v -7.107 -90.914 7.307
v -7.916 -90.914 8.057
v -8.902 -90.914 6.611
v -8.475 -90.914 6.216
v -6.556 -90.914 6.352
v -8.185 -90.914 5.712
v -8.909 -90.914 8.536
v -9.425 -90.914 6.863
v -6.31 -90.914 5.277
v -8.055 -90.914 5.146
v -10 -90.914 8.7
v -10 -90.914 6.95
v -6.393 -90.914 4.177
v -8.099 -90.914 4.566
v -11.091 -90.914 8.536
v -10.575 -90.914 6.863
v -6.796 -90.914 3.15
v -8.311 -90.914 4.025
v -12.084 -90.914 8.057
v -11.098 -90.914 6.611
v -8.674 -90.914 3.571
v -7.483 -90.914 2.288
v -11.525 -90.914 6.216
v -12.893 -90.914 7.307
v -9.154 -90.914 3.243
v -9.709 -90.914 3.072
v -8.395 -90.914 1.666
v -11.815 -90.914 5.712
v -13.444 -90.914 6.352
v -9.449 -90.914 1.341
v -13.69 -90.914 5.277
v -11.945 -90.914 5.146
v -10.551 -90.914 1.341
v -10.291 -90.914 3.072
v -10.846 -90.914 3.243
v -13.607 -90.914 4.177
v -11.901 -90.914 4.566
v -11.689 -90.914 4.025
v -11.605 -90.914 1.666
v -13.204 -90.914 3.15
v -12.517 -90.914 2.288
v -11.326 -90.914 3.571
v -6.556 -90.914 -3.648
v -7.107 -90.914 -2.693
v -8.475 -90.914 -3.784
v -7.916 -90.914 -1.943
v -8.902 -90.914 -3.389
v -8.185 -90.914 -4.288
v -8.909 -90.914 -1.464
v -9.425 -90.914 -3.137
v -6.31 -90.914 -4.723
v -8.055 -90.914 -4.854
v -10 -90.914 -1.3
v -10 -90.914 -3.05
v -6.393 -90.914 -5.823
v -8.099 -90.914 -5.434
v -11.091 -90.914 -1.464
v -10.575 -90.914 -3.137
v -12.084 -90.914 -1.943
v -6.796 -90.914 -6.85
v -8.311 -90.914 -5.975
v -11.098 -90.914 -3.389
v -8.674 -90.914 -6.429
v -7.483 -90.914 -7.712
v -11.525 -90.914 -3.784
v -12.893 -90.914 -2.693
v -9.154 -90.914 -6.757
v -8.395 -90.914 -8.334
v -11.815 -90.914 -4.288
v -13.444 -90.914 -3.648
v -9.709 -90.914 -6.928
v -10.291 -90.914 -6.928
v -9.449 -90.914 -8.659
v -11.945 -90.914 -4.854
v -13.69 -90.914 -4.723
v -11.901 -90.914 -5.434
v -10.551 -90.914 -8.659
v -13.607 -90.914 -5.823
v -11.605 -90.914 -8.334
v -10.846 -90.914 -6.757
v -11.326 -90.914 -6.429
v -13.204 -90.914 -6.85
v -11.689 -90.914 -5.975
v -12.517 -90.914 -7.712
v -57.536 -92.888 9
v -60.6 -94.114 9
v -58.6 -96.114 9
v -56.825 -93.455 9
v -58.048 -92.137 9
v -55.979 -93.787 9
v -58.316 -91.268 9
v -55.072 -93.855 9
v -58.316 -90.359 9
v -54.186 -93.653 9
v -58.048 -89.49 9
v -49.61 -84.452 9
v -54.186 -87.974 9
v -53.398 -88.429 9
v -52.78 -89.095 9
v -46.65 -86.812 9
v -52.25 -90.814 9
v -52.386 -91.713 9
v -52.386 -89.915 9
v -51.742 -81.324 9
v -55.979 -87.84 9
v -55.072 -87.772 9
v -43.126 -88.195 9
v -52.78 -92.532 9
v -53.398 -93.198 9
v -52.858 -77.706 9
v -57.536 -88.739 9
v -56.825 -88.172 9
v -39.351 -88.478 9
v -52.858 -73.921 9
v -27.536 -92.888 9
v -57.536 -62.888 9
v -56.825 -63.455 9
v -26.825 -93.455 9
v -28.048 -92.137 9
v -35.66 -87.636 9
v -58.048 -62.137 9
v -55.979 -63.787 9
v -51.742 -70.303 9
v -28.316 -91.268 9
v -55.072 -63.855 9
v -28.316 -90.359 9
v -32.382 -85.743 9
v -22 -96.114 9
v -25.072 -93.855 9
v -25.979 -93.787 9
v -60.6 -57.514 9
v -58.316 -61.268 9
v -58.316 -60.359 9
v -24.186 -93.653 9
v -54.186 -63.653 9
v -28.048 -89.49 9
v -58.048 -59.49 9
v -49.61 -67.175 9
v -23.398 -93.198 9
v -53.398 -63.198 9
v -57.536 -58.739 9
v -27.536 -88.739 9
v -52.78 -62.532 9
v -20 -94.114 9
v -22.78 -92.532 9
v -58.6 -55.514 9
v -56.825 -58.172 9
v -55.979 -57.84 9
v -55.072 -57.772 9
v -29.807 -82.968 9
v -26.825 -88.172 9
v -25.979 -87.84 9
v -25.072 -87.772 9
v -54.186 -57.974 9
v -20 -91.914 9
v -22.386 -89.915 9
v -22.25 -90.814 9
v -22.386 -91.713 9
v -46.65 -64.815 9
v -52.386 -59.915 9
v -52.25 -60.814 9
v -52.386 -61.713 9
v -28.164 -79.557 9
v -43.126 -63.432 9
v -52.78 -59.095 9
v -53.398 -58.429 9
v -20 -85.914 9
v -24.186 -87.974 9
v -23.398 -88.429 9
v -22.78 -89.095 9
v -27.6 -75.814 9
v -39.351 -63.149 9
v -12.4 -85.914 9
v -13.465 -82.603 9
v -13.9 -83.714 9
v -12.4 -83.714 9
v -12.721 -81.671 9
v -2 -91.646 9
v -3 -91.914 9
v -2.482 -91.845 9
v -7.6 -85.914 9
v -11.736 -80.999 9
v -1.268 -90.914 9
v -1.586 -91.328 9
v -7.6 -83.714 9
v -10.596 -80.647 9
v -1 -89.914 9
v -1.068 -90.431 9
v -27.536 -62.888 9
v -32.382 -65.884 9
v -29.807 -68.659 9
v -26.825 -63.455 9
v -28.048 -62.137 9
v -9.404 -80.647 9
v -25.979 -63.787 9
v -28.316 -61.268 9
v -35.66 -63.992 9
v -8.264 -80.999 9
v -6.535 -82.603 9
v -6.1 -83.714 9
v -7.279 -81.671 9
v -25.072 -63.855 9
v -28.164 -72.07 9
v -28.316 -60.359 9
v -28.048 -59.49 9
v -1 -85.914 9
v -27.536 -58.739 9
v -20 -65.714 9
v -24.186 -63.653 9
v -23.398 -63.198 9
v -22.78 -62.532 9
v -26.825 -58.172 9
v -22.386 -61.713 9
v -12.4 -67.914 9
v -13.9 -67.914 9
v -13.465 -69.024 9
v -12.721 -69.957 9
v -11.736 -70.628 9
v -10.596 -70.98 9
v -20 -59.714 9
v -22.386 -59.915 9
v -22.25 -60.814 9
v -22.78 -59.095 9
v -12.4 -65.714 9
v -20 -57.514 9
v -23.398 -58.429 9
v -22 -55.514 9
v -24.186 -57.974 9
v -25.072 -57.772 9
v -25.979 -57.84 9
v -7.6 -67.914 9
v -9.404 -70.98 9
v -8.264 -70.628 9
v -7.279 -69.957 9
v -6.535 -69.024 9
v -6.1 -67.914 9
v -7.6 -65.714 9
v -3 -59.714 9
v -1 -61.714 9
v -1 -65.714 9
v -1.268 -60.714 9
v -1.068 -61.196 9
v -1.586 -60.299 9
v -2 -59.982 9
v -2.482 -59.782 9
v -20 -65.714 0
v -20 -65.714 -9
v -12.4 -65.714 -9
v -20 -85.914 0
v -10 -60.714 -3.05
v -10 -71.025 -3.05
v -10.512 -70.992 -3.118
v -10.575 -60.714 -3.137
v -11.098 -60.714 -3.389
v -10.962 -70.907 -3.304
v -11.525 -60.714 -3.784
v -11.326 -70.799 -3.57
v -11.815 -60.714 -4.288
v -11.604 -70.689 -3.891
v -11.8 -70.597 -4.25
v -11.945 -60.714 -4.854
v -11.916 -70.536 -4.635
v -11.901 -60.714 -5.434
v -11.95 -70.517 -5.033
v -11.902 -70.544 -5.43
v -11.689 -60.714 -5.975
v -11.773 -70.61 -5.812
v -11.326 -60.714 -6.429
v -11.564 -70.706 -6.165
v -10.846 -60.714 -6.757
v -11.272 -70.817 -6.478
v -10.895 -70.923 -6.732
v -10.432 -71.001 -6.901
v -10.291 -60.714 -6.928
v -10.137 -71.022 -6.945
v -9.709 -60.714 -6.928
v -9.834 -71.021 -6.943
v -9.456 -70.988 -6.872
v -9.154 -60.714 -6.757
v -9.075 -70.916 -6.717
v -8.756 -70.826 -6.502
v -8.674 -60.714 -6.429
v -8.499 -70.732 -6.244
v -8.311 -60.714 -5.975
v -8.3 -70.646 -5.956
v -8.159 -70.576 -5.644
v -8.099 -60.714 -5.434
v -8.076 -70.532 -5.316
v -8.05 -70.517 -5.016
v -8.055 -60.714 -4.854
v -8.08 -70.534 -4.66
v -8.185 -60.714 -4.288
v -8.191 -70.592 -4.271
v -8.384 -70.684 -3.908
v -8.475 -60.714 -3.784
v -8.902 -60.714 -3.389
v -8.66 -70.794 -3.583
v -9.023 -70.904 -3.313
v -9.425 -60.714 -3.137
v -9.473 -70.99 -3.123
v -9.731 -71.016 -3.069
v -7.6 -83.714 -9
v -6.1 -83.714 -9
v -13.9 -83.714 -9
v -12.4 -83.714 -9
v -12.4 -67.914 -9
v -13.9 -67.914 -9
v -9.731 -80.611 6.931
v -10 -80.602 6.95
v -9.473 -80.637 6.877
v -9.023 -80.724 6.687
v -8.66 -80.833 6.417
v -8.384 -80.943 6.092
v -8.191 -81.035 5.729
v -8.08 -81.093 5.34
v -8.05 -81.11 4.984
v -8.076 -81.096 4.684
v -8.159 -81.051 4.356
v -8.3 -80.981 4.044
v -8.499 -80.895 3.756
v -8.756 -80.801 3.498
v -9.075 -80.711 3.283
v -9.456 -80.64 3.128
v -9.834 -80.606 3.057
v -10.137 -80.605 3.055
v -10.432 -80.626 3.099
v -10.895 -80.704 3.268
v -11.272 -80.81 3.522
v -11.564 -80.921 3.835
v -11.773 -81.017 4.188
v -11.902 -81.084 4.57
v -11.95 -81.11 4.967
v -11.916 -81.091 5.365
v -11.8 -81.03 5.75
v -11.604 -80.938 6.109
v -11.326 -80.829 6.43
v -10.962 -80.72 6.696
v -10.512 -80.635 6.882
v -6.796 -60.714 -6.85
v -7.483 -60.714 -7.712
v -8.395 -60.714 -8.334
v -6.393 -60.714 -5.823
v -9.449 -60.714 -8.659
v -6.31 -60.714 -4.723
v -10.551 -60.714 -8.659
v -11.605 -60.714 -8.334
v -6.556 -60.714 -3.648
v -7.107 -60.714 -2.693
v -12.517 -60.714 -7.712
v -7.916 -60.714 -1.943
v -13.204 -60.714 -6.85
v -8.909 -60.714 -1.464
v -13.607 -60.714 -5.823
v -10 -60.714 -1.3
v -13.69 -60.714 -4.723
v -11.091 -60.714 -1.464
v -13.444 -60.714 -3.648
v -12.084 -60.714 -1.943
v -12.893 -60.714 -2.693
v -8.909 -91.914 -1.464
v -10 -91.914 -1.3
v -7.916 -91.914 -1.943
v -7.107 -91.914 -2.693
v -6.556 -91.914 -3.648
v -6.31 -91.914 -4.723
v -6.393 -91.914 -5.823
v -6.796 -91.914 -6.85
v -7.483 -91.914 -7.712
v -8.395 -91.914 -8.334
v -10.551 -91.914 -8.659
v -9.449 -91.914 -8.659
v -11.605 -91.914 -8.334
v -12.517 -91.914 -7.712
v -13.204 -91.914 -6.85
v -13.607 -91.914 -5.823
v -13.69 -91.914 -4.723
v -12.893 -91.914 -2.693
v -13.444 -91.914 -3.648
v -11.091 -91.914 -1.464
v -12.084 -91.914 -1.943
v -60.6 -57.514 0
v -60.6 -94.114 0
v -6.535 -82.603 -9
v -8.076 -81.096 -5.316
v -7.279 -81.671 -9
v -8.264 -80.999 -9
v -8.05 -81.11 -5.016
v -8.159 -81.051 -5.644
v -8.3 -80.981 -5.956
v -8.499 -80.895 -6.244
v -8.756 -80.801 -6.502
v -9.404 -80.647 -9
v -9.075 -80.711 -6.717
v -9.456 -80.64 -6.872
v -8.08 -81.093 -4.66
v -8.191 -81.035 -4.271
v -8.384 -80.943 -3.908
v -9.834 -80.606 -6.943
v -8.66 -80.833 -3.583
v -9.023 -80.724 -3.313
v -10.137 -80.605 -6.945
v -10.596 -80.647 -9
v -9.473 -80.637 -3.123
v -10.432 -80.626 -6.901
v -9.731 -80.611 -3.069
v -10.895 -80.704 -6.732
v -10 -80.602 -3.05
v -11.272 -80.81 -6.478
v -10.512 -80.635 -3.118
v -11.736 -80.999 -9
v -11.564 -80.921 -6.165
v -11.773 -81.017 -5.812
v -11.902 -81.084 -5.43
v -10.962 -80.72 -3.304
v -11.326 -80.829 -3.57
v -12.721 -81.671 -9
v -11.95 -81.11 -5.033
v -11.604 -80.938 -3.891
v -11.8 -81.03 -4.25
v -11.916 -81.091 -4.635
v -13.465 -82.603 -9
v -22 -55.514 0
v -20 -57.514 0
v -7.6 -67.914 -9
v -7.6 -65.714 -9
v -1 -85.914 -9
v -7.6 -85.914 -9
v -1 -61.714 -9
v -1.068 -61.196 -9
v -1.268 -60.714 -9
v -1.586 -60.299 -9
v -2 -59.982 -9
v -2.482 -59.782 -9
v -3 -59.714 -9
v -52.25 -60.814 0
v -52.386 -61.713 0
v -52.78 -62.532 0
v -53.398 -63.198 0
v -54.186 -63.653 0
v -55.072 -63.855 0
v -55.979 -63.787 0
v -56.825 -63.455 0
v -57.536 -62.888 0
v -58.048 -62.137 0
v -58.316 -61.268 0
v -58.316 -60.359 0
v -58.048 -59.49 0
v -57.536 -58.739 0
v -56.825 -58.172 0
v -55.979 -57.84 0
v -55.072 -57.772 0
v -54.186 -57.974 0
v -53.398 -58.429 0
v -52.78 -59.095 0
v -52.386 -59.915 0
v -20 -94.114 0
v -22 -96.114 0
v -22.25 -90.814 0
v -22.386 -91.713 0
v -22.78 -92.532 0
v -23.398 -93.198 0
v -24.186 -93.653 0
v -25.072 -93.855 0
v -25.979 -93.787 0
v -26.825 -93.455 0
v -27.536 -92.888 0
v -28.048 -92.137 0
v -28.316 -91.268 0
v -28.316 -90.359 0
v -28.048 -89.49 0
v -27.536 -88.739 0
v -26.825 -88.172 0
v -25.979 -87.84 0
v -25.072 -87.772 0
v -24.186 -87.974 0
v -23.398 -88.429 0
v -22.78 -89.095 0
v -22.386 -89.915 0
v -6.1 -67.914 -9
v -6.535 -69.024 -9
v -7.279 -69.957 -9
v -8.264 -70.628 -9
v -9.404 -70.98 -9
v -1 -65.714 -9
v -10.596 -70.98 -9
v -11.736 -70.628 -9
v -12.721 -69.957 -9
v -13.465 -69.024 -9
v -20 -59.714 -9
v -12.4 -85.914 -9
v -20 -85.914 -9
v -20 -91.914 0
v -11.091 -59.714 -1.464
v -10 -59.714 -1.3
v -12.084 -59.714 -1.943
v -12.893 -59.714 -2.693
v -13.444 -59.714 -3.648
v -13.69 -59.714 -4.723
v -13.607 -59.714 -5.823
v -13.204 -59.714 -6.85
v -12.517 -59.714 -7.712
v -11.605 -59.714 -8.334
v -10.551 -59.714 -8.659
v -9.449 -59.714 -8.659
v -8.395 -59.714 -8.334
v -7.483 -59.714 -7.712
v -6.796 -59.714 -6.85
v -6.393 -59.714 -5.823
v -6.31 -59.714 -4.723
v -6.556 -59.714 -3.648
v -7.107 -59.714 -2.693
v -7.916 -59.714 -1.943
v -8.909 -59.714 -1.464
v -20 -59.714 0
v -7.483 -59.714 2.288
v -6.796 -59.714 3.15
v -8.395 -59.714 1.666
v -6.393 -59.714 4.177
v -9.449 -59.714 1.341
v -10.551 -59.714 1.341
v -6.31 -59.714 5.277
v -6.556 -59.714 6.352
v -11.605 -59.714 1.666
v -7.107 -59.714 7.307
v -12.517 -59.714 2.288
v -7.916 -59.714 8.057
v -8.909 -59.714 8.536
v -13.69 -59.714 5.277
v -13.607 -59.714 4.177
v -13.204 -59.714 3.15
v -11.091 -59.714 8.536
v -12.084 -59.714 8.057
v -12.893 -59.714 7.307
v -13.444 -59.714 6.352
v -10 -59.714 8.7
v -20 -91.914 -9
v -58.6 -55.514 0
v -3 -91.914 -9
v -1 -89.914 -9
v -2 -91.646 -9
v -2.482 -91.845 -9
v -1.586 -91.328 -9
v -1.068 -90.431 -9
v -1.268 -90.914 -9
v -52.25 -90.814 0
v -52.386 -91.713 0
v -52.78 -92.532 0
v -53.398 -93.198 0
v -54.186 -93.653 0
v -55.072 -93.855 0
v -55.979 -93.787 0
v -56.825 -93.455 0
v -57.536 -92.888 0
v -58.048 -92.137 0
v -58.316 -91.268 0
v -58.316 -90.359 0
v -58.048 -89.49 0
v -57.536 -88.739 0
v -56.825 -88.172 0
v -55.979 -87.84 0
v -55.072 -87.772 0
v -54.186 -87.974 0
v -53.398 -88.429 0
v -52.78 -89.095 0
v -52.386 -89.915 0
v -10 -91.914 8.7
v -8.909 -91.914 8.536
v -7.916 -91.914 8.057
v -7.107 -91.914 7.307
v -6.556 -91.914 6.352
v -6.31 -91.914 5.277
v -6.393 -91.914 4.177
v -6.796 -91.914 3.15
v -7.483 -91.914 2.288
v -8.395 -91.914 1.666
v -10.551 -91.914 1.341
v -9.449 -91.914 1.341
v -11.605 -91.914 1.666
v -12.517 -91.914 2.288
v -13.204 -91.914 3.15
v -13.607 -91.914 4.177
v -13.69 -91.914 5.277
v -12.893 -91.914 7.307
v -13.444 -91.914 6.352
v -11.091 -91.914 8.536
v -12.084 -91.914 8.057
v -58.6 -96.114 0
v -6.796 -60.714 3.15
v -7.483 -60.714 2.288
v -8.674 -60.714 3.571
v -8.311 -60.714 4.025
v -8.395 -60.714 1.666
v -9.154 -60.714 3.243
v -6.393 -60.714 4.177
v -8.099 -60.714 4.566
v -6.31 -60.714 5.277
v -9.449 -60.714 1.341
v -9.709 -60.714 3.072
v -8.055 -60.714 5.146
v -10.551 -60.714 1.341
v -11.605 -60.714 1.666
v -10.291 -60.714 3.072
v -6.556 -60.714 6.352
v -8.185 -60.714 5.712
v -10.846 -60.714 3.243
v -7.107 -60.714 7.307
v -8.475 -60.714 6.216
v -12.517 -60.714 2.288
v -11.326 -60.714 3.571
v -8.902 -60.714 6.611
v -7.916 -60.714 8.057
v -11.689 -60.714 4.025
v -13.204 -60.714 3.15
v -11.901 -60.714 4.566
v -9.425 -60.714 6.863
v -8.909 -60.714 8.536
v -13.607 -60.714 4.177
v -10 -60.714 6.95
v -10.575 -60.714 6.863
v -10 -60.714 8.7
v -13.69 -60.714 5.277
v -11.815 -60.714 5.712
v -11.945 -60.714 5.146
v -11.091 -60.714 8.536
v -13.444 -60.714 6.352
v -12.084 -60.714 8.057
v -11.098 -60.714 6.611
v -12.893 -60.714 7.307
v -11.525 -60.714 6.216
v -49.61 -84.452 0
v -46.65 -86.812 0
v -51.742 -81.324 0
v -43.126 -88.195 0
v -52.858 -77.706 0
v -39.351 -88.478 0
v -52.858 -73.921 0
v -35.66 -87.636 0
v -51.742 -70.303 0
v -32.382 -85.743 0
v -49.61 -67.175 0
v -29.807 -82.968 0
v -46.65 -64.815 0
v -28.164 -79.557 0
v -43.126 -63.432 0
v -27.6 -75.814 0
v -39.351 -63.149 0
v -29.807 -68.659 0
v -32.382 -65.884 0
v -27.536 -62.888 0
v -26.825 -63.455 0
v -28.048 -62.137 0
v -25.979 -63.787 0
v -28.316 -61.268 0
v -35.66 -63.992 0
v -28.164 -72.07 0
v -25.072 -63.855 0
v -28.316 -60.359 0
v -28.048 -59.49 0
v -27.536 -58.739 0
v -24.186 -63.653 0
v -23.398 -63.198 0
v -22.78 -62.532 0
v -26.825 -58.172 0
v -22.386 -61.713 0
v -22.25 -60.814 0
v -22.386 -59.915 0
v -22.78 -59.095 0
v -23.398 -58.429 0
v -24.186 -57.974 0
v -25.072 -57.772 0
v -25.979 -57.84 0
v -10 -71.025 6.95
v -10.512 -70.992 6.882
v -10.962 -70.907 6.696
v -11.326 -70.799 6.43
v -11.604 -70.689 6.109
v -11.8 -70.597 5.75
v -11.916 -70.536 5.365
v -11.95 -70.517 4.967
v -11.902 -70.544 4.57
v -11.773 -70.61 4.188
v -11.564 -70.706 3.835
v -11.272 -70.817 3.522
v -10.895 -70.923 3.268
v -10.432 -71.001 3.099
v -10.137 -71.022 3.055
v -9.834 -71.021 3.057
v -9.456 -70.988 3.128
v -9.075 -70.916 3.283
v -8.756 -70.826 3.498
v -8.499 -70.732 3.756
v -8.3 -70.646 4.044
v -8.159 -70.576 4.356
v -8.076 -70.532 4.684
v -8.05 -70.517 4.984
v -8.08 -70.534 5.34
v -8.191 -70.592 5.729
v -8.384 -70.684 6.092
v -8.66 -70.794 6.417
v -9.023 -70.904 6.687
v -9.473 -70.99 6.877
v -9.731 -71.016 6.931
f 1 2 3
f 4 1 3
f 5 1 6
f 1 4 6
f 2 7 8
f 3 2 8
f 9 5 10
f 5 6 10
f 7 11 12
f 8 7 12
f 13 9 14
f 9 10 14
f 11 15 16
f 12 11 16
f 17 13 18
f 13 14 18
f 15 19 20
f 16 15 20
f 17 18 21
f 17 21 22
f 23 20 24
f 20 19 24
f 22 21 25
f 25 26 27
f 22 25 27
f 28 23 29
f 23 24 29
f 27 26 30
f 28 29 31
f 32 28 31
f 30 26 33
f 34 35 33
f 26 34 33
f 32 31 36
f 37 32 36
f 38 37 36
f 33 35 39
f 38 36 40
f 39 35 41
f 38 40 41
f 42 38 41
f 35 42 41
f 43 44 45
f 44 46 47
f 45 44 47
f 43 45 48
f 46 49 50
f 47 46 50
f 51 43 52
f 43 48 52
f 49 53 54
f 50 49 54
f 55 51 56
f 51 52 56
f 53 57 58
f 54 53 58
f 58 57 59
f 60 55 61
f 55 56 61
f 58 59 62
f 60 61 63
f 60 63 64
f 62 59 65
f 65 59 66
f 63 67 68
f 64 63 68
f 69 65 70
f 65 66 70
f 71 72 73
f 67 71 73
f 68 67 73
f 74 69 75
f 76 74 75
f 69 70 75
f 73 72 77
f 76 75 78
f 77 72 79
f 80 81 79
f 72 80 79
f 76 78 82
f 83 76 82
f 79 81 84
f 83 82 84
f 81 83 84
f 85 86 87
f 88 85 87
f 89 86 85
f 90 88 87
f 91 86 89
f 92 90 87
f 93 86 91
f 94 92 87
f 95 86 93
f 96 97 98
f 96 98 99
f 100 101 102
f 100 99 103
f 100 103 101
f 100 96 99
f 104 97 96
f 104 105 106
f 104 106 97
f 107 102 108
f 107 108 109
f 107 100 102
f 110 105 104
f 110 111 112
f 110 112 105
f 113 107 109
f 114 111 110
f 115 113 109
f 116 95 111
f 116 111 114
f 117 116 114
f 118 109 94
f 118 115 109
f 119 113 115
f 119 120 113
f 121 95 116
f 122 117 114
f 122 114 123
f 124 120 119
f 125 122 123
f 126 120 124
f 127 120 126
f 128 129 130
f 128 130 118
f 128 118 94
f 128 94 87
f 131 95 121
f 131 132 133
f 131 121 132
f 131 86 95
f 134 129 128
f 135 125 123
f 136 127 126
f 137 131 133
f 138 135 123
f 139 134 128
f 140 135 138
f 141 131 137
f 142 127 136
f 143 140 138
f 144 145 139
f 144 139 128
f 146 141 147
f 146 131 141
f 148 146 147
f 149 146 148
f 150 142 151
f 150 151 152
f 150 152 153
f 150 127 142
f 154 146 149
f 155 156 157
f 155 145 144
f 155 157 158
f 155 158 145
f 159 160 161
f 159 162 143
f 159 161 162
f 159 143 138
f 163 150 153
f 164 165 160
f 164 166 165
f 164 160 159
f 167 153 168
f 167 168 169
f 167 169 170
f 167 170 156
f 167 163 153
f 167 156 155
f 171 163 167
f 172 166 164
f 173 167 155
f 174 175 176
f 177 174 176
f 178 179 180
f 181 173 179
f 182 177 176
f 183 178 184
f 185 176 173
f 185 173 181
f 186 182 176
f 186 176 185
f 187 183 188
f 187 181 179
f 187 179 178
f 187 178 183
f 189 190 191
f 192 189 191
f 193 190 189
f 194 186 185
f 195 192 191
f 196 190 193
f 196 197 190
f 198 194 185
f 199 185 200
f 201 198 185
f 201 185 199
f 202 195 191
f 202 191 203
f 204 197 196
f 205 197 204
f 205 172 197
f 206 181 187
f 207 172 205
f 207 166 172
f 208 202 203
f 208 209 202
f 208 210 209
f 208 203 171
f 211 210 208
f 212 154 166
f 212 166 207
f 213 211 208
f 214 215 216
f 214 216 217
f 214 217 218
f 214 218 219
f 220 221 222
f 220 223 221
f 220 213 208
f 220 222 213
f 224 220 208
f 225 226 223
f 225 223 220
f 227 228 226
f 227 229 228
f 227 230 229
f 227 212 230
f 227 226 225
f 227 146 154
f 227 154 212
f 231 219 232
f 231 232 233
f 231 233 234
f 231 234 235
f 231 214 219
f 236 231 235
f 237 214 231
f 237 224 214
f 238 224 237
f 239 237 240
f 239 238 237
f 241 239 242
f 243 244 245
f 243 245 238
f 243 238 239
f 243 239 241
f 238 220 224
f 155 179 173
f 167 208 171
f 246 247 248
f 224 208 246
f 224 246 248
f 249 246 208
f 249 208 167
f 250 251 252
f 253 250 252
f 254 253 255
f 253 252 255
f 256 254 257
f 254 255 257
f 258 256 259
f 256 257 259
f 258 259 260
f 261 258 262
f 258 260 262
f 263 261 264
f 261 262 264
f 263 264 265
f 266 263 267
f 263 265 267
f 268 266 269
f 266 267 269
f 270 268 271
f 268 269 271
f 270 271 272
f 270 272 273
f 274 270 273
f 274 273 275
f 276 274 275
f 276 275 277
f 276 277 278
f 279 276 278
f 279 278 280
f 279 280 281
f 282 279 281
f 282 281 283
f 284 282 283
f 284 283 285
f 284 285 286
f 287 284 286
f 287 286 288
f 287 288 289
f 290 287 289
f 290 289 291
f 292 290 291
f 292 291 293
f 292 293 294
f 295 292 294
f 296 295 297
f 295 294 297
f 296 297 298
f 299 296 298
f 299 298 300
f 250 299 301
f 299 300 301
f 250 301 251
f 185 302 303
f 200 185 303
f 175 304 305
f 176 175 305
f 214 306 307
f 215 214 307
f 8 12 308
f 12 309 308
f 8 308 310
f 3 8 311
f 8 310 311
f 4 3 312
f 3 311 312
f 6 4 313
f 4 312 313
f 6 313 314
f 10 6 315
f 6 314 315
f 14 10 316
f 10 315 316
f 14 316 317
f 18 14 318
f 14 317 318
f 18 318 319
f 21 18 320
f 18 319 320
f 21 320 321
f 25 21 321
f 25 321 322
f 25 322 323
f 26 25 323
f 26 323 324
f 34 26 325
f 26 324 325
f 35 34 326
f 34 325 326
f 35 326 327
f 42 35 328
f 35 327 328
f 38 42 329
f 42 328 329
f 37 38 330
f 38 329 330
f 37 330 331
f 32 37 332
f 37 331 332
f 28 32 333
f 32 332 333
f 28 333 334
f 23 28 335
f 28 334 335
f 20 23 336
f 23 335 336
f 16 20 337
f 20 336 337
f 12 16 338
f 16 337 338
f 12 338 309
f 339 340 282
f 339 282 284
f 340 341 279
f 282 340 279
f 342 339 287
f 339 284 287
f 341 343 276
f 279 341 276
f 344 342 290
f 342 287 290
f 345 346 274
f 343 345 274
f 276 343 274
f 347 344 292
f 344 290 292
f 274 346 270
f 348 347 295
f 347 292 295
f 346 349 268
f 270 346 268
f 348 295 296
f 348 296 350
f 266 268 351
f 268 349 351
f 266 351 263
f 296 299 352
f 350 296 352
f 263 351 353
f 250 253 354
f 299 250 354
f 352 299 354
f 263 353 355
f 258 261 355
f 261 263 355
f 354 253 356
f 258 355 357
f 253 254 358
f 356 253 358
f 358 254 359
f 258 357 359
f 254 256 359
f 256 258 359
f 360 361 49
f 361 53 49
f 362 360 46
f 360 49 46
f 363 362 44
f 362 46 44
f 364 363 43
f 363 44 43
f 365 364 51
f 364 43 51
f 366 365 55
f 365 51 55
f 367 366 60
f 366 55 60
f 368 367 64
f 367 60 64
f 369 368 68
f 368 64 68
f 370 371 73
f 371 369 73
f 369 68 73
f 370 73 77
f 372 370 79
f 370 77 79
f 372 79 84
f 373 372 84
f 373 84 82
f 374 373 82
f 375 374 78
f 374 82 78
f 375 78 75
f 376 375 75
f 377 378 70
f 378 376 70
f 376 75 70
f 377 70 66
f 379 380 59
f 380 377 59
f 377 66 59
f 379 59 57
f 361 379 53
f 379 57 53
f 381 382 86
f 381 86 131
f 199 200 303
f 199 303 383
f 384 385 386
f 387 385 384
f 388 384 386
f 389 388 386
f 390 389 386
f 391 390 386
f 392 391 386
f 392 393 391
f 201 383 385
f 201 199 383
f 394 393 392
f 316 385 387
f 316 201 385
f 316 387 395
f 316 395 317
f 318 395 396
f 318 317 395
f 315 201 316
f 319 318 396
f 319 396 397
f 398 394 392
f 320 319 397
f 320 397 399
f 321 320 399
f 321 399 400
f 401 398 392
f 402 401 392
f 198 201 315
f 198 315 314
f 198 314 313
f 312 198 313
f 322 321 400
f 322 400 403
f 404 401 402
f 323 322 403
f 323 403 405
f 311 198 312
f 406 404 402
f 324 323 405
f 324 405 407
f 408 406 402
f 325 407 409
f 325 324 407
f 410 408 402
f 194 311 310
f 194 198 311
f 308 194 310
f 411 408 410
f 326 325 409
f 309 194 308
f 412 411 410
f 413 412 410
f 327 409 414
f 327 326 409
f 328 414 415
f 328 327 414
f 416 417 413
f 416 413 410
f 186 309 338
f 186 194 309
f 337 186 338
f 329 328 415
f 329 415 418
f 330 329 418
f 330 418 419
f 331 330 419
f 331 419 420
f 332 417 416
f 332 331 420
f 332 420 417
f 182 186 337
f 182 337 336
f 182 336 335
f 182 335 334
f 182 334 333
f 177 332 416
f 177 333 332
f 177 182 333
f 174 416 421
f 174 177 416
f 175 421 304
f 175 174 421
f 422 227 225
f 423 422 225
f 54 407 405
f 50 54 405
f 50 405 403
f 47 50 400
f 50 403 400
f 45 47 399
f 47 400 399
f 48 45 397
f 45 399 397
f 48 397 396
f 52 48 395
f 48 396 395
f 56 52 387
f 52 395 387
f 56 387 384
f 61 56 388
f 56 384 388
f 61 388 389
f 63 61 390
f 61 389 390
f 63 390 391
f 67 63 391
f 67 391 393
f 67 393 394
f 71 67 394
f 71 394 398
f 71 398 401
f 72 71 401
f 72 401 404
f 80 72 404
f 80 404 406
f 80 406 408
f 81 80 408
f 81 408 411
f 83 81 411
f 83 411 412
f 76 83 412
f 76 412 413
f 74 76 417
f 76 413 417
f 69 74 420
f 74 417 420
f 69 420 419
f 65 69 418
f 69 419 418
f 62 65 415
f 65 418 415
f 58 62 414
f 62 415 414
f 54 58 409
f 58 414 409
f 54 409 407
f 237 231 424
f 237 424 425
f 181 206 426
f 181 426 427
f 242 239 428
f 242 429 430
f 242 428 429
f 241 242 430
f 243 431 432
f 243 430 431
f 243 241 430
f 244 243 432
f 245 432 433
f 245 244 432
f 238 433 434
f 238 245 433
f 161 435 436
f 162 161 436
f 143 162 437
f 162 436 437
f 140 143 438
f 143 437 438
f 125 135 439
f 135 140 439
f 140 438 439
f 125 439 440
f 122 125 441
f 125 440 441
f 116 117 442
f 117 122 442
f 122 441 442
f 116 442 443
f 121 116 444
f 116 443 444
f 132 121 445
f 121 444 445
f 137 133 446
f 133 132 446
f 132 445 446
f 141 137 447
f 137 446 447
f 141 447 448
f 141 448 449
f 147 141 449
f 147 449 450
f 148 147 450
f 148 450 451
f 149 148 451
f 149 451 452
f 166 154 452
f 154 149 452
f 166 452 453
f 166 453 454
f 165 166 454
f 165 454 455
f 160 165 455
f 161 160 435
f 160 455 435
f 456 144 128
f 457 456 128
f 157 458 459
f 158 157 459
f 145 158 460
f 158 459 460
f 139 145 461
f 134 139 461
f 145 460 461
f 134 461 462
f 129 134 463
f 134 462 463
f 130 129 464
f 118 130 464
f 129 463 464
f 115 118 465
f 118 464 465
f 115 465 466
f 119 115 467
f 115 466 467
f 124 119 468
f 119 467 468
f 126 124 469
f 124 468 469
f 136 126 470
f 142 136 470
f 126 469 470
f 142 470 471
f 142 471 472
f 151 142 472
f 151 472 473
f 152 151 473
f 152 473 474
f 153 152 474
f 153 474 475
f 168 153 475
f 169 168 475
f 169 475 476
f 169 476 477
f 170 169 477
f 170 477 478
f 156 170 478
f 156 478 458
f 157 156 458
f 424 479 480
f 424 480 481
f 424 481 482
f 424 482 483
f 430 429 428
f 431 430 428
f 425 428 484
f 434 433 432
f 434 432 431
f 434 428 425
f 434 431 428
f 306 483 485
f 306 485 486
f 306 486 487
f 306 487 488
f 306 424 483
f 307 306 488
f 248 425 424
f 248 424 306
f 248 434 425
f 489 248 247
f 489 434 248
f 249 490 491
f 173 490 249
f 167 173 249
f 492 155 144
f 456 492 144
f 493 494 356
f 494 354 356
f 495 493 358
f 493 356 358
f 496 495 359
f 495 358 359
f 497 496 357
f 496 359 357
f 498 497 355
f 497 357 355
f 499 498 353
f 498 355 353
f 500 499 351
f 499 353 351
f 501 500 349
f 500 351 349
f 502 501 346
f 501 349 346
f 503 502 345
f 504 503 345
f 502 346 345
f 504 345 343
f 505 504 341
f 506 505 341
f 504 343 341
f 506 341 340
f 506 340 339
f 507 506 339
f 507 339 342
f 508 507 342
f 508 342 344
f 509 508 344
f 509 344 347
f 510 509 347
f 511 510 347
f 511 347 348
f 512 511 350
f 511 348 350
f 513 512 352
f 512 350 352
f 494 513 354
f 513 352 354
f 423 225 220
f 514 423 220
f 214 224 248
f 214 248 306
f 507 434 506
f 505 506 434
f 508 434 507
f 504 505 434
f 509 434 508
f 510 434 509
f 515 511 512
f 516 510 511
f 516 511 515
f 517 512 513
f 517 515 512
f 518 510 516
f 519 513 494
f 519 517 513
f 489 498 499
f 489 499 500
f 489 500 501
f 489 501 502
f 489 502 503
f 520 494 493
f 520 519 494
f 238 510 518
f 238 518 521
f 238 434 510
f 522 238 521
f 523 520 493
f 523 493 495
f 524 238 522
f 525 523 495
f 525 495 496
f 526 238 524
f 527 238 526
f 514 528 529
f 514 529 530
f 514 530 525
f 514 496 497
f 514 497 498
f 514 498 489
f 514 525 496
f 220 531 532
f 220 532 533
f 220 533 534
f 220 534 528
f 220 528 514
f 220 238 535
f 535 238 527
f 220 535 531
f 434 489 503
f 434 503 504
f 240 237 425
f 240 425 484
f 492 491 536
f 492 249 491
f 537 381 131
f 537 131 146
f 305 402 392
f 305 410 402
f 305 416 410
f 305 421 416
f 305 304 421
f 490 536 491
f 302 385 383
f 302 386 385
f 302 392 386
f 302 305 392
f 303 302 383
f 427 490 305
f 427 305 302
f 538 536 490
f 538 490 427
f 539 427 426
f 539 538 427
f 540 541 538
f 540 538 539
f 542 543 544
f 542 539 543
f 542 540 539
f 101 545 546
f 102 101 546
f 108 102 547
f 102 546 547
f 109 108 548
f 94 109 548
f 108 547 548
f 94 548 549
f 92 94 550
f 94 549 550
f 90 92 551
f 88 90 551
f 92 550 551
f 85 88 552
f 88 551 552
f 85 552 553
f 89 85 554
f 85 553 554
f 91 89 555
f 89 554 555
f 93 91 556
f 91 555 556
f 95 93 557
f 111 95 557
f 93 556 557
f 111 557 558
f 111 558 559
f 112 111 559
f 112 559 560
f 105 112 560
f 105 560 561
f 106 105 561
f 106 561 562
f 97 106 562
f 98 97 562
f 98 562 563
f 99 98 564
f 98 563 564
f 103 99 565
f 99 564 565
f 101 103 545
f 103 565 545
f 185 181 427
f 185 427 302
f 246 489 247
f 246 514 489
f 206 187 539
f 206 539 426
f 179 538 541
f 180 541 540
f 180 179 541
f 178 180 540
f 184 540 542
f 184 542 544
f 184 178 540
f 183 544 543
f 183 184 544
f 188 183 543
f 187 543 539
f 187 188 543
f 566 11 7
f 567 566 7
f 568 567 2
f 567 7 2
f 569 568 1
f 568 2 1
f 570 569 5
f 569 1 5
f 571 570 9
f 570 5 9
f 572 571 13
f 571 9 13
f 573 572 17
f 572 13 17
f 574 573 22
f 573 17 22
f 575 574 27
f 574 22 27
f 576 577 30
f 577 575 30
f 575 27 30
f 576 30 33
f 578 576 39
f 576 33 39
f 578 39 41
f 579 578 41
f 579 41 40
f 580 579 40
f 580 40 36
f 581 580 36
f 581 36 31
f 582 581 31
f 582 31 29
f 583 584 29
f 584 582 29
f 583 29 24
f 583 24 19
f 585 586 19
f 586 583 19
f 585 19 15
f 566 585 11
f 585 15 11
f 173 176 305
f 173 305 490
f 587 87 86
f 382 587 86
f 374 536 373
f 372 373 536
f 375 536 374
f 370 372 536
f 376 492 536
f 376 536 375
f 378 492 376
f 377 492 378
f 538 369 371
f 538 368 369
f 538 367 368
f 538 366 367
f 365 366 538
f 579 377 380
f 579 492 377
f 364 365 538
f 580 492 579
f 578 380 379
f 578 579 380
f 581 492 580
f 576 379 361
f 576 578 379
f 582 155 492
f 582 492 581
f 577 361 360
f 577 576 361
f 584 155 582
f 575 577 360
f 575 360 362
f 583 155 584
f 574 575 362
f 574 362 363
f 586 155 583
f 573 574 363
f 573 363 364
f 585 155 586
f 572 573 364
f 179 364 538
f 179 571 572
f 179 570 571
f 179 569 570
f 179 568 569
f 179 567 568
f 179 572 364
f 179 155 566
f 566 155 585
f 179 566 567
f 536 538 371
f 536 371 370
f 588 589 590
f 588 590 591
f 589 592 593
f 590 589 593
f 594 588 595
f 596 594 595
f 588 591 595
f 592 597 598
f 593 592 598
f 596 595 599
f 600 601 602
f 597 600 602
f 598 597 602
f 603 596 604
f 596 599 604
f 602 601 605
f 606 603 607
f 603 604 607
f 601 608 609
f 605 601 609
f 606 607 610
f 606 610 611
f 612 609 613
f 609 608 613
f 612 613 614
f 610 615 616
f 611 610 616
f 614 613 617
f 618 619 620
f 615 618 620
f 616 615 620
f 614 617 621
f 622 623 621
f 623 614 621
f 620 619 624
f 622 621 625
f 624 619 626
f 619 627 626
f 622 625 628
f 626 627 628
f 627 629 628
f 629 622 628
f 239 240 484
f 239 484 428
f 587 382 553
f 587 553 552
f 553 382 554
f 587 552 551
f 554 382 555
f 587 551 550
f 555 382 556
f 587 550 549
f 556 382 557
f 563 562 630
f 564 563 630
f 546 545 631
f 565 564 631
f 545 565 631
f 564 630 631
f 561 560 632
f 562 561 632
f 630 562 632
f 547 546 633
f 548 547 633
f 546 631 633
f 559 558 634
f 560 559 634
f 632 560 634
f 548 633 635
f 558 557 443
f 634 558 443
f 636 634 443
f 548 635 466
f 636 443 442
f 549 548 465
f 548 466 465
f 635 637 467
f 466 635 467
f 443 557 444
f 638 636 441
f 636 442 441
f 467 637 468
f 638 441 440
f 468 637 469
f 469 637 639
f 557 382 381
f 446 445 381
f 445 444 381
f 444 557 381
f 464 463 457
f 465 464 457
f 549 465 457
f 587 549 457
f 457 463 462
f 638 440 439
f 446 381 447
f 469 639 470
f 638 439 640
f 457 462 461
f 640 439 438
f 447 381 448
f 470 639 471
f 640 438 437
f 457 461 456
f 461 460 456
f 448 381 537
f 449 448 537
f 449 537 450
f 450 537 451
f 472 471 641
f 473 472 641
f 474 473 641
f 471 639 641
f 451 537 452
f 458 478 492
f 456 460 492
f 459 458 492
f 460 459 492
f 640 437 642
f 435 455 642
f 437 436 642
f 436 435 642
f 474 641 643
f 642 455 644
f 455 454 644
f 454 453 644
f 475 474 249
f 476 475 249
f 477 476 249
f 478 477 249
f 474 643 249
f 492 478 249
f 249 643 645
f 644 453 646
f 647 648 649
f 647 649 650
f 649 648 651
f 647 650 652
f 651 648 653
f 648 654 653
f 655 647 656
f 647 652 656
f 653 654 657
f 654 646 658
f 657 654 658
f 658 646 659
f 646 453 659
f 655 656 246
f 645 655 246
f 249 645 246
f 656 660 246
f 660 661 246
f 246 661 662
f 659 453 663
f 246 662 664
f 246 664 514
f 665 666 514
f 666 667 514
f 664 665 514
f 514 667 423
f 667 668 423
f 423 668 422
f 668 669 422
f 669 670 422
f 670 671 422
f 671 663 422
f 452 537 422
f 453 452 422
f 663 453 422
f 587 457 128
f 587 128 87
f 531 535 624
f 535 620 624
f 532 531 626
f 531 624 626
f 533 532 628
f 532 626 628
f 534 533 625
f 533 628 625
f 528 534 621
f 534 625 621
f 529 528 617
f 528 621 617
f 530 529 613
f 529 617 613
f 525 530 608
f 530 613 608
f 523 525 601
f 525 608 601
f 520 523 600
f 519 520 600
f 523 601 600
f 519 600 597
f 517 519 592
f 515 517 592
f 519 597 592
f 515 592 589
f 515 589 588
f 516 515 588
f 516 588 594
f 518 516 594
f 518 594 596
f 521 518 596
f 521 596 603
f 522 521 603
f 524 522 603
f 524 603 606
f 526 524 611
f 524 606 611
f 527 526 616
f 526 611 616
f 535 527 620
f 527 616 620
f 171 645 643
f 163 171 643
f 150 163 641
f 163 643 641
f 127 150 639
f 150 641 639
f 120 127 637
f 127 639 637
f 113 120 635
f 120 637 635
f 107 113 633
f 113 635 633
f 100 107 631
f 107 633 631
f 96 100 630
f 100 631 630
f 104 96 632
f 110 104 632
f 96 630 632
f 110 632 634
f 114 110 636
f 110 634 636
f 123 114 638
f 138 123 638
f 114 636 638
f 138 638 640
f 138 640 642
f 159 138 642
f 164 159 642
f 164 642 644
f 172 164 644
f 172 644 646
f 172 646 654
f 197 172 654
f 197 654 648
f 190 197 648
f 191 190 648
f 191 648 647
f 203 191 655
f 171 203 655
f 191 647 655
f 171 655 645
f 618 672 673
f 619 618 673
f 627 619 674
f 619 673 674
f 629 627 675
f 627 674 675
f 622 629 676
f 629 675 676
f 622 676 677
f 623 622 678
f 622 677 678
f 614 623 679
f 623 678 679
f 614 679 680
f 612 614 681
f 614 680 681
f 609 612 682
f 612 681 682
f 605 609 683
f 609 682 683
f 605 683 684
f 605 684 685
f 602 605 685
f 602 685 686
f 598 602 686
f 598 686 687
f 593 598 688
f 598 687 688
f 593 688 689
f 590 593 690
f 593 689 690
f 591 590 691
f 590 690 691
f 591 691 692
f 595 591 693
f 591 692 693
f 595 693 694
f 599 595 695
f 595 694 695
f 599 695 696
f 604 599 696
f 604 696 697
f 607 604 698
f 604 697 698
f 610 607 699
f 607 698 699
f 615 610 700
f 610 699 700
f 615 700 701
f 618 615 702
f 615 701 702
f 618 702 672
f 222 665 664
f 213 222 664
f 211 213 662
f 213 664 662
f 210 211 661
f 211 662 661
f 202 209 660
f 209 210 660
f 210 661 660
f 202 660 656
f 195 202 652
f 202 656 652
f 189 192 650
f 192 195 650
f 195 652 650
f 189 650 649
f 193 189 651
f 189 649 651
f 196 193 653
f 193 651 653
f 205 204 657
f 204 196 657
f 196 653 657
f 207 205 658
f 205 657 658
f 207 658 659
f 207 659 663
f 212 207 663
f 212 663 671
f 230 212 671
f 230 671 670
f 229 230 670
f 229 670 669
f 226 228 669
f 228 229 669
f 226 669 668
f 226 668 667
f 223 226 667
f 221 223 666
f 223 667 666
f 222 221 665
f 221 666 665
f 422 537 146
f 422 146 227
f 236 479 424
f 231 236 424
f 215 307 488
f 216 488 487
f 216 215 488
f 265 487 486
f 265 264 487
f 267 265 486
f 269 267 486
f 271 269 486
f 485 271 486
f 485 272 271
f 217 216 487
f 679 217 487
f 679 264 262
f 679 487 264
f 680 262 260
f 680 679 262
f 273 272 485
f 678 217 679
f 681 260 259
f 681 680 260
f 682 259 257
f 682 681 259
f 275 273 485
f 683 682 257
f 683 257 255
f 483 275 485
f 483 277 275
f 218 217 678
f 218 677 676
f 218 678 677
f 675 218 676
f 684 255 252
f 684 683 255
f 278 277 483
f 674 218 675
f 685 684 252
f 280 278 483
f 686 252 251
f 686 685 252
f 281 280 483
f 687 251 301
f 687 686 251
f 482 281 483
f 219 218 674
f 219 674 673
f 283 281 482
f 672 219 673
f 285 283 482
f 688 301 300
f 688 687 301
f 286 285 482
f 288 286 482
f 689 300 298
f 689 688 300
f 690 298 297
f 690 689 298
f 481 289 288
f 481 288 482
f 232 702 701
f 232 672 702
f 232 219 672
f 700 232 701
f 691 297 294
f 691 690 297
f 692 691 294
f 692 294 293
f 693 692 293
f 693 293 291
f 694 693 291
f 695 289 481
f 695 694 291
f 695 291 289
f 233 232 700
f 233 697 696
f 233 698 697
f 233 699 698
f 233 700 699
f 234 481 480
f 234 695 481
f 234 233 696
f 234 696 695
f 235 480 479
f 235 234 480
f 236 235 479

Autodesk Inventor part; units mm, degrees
ref_plane "YZ Plane" through (0, 0, 0) normal (1, 0, 0) x (0, 1, 0)
ref_plane "XZ Plane" through (0, 0, 0) normal (0, 1, 0) x (-1, 0, 0)
ref_plane "XY Plane" through (0, 0, 0) normal (0, 0, 1) x (1, 0, 0)
sketch "Sketch1" plane through (0, 0, 0) normal (0, 0, 1) x (1, 0, 0)
  line L0 (-20, -85.8136) -> (-20, -78.3136) projected
  line L1 (-20, -78.3136) -> (-18.5, -78.3136) projected
  line L2 (-18.5, -78.3136) -> (-18.5, -82.5636) projected
  line L3 (-18.5, -82.5636) -> (-17.8462, -82.5636) projected
  line L4 (-17.8462, -82.5636) -> (-14, -78.7175) projected
  line L5 (-14, -78.7175) -> (-14, -72.9098) projected
  line L6 (-14, -72.9098) -> (-17.8462, -69.0636) projected
  line L7 (-17.8462, -69.0636) -> (-18.5, -69.0636) projected
  line L8 (-18.5, -69.0636) -> (-18.5, -73.3136) projected
  line L9 (-18.5, -73.3136) -> (-20, -73.3136) projected
  line L10 (-20, -73.3136) -> (-20, -65.8136) projected
  line L11 (-20, -65.8136) -> (-12.5, -65.8136) projected
  line L12 (-12.5, -65.8136) -> (-12.5, -67.3136) projected
  line L13 (-12.5, -67.3136) -> (-16.75, -67.3136) projected
  line L14 (-16.75, -67.3136) -> (-16.75, -68.0385) projected
  line L15 (-16.75, -68.0385) -> (-12.9748, -71.8136) projected
  line L16 (-12.9748, -71.8136) -> (-7.0252, -71.8136) projected
  line L17 (-7.0252, -71.8136) -> (-3.25, -68.0385) projected
  line L18 (-3.25, -68.0385) -> (-3.25, -67.3136) projected
  line L19 (-3.25, -67.3136) -> (-7.5, -67.3136) projected
  line L20 (-7.5, -67.3136) -> (-7.5, -65.8136) projected
  line L21 (-7.5, -65.8136) -> (0, -65.8136) projected
  line L22 (0, -65.8136) -> (0, -73.3136) projected
  line L23 (0, -73.3136) -> (-1.5, -73.3136) projected
  line L24 (-1.5, -73.3136) -> (-1.5, -69.0636) projected
  line L25 (-1.5, -69.0636) -> (-2.1538, -69.0636) projected
  line L26 (-2.1538, -69.0636) -> (-6, -72.9098) projected
  line L27 (-6, -72.9098) -> (-6, -78.7175) projected
  line L28 (-6, -78.7175) -> (-2.1538, -82.5636) projected
  line L29 (-2.1538, -82.5636) -> (-1.5, -82.5636) projected
  line L30 (-1.5, -82.5636) -> (-1.5, -78.3136) projected
  line L31 (-1.5, -78.3136) -> (0, -78.3136) projected
  line L32 (0, -78.3136) -> (0, -85.8136) projected
  line L33 (0, -85.8136) -> (-7.5, -85.8136) projected
  line L34 (-7.5, -85.8136) -> (-7.5, -84.3136) projected
  line L35 (-7.5, -84.3136) -> (-3.25, -84.3136) projected
  line L36 (-3.25, -84.3136) -> (-3.25, -83.5888) projected
  line L37 (-3.25, -83.5888) -> (-7.0252, -79.8136) projected
  line L38 (-7.0252, -79.8136) -> (-12.9748, -79.8136) projected
  line L39 (-12.9748, -79.8136) -> (-16.75, -83.5888) projected
  line L40 (-16.75, -83.5888) -> (-16.75, -84.3136) projected
  line L41 (-16.75, -84.3136) -> (-12.5, -84.3136) projected
  line L42 (-12.5, -84.3136) -> (-12.5, -85.8136) projected
  line L43 (-12.5, -85.8136) -> (-20, -85.8136) projected
  circle A0 centre (-10, -75.8136) radius 2.15 projected
  line L44 (-12.4, -65.7136) -> (-7.6, -65.7136)
  line L45 (-7.6, -65.7136) -> (-7.6, -67.9136)
  line L46 (-7.6, -67.9136) -> (-12.4, -67.9136)
  line L47 (-12.4, -67.9136) -> (-12.4, -65.7136)
  line L48 (-12.4, -67.9136) -> (-13.9, -67.9136)
  line L49 (-7.6, -67.9136) -> (-6.1, -67.9136)
  arc A1 (-13.9, -67.9136) -> (-6.1, -67.9136) centre (-10, -67.0248) ccw
  line L50 (-20, -65.8136) -> (-20, -59.8136)
  line L51 (-14, -75.8136) -> (-32.3565, -75.8136)
  line L52 (-20, -75.8136) -> (-60.6, -75.8136)
  line L53 (-60.6, -75.8136) -> (-60.6, -57.5136)
  line L54 (-58.6, -55.5136) -> (-22, -55.5136)
  line L55 (-20, -57.5136) -> (-20, -75.8136)
  line L56 (-22, -55.5136) -> (-20, -57.5136)
  line L57 (-60.6, -57.5136) -> (-58.6, -55.5136)
  arc A2 (-27.6, -75.8136) -> (-53, -75.8136) centre (-40.3, -75.8136) ccw
  circle A3 centre (-55.3, -60.8136) radius 3.05
  circle A4 centre (-25.3, -60.8136) radius 3.05
  line L58 (-20, -65.7136) -> (-1, -65.7136)
  line L59 (-1, -65.7136) -> (-1, -61.7136)
  line L60 (-3, -59.7136) -> (-20, -59.7136)
  line L61 (-20, -59.7136) -> (-20, -65.7136)
  arc A5 (-1, -61.7136) -> (-3, -59.7136) centre (-3, -61.7136) ccw
  point P0 (0, 0)
  point P1 (-1, -65.8136)
  point P2 (-1, -59.8136)
  point P3 (-60.6, -55.5136)
  point P4 (-20, -55.5136)
  point P5 (-1, -59.7136)
  dimension "d3" = 4.8
  dimension "d4" = 2.2
  dimension "d6" = 0.1
  dimension "d7" = 1.5
  dimension "d8" = 1.5
  dimension "d9" = 4
  dimension "d10" = 19
  dimension "d11" = 6
  dimension "d15" = 40.6
  dimension "d16" = 20.3
  dimension "d17" = 2
  dimension "d18" = 2
  dimension "d19" = 2
  dimension "d20" = 2
  dimension "d21" = 25.4
  dimension "d22" = 6.1
  dimension "d23" = 5.3
  dimension "d24" = 5.3
  dimension "d25" = 6.1
  dimension "d26" = 5.3
  dimension "d27" = 5.3
  dimension "d32" = 0.6
  dimension "d33" = 19
  dimension "d34" = 6
  dimension "d35" = 2
extrude "Extrusion1" add sketch "Sketch1" along normal blind 9 contours L51 A2 L52 L53 L57 L54 L56 L55 L50 L10 | L50 L55 L60 A5 L59 L58 L44 | L44 L45 L46 L47 | L46 L49 A1 L48
sketch "Sketch4" plane through (0, 0, 0) normal (0, 0, -1) x (-1, 0, 0)
  line L0 (22, -55.5136) -> (58.6, -55.5136) projected
  line L1 (20, -57.5136) -> (22, -55.5136) projected
  line L2 (20, -59.7136) -> (20, -57.5136) projected
  line L3 (3, -59.7136) -> (20, -59.7136) projected
  arc A0 (3, -59.7136) -> (1, -61.7136) centre (3, -61.7136) ccw projected
  line L4 (1, -65.7136) -> (1, -61.7136) projected
  line L5 (7.6, -65.7136) -> (1, -65.7136) projected
  line L6 (7.6, -67.9136) -> (7.6, -65.7136) projected
  line L7 (6.1, -67.9136) -> (7.6, -67.9136) projected
  arc A1 (6.1, -67.9136) -> (13.9, -67.9136) centre (10, -67.0248) ccw projected
  line L8 (12.4, -67.9136) -> (13.9, -67.9136) projected
  line L9 (12.4, -65.7136) -> (12.4, -67.9136) projected
  line L10 (20, -65.7136) -> (12.4, -65.7136) projected
  line L11 (20, -75.8136) -> (20, -65.7136) projected
  line L12 (27.6, -75.8136) -> (20, -75.8136) projected
  arc A2 (53, -75.8136) -> (27.6, -75.8136) centre (40.3, -75.8136) ccw projected
  line L13 (60.6, -75.8136) -> (53, -75.8136) projected
  line L14 (60.6, -57.5136) -> (60.6, -75.8136) projected
  line L15 (58.6, -55.5136) -> (60.6, -57.5136) projected
  circle A3 centre (25.3, -60.8136) radius 3.05 projected
  circle A4 centre (55.3, -60.8136) radius 3.05 projected
  line L16 (20, -59.7136) -> (20, -57.5136) projected
  line L17 (20, -75.8136) -> (20, -65.7136) projected
  line L18 (20, -59.7136) -> (20, -65.7136)
  point P0 (0, 0)
extrude "Extrusion3" add sketch "Sketch4" along normal blind 9 contours L18 L10 L9 L8 A1 L7 L6 L5 L4 A0 L3
sketch "Sketch5" plane through (-20, -59.7136, 9) normal (0, 1, 0) x (1, 0, 0)
  line L0 (6.1, 18) -> (6.1, 0) projected
  line L1 (13.9, 18) -> (13.9, 0) projected
  circle A0 centre (10, 4) radius 1.95
  circle A1 centre (10, 14) radius 1.95
  line L2 (0, 18) -> (17, 18) projected
  line L3 (17, 0) -> (0, 0) projected
  point P0 (20, 9)
  dimension "d38" = 3.9
  dimension "d39" = 3.9
  dimension "d40" = 3.9
  dimension "d41" = 3.9
  dimension "d42" = 4
  dimension "d43" = 4
hole "Hole1" at (-10, -59.7136, 5) at (-10, -59.7136, -5) direction (0, -1, 0) diameter 3.9 end through all counterbore diameter 7.4 counterbore depth 1
mirror "Mirror1" about plane through (-60.6, -75.8136, 0) normal (0, -1, 0) of "Extrusion1", "Extrusion3", "Hole1"
equation "\"d18\" = d17"
equation "\"d19\" = d17"
equation "\"d20\" = d19"
properties part number "Rain_LensHolder"
